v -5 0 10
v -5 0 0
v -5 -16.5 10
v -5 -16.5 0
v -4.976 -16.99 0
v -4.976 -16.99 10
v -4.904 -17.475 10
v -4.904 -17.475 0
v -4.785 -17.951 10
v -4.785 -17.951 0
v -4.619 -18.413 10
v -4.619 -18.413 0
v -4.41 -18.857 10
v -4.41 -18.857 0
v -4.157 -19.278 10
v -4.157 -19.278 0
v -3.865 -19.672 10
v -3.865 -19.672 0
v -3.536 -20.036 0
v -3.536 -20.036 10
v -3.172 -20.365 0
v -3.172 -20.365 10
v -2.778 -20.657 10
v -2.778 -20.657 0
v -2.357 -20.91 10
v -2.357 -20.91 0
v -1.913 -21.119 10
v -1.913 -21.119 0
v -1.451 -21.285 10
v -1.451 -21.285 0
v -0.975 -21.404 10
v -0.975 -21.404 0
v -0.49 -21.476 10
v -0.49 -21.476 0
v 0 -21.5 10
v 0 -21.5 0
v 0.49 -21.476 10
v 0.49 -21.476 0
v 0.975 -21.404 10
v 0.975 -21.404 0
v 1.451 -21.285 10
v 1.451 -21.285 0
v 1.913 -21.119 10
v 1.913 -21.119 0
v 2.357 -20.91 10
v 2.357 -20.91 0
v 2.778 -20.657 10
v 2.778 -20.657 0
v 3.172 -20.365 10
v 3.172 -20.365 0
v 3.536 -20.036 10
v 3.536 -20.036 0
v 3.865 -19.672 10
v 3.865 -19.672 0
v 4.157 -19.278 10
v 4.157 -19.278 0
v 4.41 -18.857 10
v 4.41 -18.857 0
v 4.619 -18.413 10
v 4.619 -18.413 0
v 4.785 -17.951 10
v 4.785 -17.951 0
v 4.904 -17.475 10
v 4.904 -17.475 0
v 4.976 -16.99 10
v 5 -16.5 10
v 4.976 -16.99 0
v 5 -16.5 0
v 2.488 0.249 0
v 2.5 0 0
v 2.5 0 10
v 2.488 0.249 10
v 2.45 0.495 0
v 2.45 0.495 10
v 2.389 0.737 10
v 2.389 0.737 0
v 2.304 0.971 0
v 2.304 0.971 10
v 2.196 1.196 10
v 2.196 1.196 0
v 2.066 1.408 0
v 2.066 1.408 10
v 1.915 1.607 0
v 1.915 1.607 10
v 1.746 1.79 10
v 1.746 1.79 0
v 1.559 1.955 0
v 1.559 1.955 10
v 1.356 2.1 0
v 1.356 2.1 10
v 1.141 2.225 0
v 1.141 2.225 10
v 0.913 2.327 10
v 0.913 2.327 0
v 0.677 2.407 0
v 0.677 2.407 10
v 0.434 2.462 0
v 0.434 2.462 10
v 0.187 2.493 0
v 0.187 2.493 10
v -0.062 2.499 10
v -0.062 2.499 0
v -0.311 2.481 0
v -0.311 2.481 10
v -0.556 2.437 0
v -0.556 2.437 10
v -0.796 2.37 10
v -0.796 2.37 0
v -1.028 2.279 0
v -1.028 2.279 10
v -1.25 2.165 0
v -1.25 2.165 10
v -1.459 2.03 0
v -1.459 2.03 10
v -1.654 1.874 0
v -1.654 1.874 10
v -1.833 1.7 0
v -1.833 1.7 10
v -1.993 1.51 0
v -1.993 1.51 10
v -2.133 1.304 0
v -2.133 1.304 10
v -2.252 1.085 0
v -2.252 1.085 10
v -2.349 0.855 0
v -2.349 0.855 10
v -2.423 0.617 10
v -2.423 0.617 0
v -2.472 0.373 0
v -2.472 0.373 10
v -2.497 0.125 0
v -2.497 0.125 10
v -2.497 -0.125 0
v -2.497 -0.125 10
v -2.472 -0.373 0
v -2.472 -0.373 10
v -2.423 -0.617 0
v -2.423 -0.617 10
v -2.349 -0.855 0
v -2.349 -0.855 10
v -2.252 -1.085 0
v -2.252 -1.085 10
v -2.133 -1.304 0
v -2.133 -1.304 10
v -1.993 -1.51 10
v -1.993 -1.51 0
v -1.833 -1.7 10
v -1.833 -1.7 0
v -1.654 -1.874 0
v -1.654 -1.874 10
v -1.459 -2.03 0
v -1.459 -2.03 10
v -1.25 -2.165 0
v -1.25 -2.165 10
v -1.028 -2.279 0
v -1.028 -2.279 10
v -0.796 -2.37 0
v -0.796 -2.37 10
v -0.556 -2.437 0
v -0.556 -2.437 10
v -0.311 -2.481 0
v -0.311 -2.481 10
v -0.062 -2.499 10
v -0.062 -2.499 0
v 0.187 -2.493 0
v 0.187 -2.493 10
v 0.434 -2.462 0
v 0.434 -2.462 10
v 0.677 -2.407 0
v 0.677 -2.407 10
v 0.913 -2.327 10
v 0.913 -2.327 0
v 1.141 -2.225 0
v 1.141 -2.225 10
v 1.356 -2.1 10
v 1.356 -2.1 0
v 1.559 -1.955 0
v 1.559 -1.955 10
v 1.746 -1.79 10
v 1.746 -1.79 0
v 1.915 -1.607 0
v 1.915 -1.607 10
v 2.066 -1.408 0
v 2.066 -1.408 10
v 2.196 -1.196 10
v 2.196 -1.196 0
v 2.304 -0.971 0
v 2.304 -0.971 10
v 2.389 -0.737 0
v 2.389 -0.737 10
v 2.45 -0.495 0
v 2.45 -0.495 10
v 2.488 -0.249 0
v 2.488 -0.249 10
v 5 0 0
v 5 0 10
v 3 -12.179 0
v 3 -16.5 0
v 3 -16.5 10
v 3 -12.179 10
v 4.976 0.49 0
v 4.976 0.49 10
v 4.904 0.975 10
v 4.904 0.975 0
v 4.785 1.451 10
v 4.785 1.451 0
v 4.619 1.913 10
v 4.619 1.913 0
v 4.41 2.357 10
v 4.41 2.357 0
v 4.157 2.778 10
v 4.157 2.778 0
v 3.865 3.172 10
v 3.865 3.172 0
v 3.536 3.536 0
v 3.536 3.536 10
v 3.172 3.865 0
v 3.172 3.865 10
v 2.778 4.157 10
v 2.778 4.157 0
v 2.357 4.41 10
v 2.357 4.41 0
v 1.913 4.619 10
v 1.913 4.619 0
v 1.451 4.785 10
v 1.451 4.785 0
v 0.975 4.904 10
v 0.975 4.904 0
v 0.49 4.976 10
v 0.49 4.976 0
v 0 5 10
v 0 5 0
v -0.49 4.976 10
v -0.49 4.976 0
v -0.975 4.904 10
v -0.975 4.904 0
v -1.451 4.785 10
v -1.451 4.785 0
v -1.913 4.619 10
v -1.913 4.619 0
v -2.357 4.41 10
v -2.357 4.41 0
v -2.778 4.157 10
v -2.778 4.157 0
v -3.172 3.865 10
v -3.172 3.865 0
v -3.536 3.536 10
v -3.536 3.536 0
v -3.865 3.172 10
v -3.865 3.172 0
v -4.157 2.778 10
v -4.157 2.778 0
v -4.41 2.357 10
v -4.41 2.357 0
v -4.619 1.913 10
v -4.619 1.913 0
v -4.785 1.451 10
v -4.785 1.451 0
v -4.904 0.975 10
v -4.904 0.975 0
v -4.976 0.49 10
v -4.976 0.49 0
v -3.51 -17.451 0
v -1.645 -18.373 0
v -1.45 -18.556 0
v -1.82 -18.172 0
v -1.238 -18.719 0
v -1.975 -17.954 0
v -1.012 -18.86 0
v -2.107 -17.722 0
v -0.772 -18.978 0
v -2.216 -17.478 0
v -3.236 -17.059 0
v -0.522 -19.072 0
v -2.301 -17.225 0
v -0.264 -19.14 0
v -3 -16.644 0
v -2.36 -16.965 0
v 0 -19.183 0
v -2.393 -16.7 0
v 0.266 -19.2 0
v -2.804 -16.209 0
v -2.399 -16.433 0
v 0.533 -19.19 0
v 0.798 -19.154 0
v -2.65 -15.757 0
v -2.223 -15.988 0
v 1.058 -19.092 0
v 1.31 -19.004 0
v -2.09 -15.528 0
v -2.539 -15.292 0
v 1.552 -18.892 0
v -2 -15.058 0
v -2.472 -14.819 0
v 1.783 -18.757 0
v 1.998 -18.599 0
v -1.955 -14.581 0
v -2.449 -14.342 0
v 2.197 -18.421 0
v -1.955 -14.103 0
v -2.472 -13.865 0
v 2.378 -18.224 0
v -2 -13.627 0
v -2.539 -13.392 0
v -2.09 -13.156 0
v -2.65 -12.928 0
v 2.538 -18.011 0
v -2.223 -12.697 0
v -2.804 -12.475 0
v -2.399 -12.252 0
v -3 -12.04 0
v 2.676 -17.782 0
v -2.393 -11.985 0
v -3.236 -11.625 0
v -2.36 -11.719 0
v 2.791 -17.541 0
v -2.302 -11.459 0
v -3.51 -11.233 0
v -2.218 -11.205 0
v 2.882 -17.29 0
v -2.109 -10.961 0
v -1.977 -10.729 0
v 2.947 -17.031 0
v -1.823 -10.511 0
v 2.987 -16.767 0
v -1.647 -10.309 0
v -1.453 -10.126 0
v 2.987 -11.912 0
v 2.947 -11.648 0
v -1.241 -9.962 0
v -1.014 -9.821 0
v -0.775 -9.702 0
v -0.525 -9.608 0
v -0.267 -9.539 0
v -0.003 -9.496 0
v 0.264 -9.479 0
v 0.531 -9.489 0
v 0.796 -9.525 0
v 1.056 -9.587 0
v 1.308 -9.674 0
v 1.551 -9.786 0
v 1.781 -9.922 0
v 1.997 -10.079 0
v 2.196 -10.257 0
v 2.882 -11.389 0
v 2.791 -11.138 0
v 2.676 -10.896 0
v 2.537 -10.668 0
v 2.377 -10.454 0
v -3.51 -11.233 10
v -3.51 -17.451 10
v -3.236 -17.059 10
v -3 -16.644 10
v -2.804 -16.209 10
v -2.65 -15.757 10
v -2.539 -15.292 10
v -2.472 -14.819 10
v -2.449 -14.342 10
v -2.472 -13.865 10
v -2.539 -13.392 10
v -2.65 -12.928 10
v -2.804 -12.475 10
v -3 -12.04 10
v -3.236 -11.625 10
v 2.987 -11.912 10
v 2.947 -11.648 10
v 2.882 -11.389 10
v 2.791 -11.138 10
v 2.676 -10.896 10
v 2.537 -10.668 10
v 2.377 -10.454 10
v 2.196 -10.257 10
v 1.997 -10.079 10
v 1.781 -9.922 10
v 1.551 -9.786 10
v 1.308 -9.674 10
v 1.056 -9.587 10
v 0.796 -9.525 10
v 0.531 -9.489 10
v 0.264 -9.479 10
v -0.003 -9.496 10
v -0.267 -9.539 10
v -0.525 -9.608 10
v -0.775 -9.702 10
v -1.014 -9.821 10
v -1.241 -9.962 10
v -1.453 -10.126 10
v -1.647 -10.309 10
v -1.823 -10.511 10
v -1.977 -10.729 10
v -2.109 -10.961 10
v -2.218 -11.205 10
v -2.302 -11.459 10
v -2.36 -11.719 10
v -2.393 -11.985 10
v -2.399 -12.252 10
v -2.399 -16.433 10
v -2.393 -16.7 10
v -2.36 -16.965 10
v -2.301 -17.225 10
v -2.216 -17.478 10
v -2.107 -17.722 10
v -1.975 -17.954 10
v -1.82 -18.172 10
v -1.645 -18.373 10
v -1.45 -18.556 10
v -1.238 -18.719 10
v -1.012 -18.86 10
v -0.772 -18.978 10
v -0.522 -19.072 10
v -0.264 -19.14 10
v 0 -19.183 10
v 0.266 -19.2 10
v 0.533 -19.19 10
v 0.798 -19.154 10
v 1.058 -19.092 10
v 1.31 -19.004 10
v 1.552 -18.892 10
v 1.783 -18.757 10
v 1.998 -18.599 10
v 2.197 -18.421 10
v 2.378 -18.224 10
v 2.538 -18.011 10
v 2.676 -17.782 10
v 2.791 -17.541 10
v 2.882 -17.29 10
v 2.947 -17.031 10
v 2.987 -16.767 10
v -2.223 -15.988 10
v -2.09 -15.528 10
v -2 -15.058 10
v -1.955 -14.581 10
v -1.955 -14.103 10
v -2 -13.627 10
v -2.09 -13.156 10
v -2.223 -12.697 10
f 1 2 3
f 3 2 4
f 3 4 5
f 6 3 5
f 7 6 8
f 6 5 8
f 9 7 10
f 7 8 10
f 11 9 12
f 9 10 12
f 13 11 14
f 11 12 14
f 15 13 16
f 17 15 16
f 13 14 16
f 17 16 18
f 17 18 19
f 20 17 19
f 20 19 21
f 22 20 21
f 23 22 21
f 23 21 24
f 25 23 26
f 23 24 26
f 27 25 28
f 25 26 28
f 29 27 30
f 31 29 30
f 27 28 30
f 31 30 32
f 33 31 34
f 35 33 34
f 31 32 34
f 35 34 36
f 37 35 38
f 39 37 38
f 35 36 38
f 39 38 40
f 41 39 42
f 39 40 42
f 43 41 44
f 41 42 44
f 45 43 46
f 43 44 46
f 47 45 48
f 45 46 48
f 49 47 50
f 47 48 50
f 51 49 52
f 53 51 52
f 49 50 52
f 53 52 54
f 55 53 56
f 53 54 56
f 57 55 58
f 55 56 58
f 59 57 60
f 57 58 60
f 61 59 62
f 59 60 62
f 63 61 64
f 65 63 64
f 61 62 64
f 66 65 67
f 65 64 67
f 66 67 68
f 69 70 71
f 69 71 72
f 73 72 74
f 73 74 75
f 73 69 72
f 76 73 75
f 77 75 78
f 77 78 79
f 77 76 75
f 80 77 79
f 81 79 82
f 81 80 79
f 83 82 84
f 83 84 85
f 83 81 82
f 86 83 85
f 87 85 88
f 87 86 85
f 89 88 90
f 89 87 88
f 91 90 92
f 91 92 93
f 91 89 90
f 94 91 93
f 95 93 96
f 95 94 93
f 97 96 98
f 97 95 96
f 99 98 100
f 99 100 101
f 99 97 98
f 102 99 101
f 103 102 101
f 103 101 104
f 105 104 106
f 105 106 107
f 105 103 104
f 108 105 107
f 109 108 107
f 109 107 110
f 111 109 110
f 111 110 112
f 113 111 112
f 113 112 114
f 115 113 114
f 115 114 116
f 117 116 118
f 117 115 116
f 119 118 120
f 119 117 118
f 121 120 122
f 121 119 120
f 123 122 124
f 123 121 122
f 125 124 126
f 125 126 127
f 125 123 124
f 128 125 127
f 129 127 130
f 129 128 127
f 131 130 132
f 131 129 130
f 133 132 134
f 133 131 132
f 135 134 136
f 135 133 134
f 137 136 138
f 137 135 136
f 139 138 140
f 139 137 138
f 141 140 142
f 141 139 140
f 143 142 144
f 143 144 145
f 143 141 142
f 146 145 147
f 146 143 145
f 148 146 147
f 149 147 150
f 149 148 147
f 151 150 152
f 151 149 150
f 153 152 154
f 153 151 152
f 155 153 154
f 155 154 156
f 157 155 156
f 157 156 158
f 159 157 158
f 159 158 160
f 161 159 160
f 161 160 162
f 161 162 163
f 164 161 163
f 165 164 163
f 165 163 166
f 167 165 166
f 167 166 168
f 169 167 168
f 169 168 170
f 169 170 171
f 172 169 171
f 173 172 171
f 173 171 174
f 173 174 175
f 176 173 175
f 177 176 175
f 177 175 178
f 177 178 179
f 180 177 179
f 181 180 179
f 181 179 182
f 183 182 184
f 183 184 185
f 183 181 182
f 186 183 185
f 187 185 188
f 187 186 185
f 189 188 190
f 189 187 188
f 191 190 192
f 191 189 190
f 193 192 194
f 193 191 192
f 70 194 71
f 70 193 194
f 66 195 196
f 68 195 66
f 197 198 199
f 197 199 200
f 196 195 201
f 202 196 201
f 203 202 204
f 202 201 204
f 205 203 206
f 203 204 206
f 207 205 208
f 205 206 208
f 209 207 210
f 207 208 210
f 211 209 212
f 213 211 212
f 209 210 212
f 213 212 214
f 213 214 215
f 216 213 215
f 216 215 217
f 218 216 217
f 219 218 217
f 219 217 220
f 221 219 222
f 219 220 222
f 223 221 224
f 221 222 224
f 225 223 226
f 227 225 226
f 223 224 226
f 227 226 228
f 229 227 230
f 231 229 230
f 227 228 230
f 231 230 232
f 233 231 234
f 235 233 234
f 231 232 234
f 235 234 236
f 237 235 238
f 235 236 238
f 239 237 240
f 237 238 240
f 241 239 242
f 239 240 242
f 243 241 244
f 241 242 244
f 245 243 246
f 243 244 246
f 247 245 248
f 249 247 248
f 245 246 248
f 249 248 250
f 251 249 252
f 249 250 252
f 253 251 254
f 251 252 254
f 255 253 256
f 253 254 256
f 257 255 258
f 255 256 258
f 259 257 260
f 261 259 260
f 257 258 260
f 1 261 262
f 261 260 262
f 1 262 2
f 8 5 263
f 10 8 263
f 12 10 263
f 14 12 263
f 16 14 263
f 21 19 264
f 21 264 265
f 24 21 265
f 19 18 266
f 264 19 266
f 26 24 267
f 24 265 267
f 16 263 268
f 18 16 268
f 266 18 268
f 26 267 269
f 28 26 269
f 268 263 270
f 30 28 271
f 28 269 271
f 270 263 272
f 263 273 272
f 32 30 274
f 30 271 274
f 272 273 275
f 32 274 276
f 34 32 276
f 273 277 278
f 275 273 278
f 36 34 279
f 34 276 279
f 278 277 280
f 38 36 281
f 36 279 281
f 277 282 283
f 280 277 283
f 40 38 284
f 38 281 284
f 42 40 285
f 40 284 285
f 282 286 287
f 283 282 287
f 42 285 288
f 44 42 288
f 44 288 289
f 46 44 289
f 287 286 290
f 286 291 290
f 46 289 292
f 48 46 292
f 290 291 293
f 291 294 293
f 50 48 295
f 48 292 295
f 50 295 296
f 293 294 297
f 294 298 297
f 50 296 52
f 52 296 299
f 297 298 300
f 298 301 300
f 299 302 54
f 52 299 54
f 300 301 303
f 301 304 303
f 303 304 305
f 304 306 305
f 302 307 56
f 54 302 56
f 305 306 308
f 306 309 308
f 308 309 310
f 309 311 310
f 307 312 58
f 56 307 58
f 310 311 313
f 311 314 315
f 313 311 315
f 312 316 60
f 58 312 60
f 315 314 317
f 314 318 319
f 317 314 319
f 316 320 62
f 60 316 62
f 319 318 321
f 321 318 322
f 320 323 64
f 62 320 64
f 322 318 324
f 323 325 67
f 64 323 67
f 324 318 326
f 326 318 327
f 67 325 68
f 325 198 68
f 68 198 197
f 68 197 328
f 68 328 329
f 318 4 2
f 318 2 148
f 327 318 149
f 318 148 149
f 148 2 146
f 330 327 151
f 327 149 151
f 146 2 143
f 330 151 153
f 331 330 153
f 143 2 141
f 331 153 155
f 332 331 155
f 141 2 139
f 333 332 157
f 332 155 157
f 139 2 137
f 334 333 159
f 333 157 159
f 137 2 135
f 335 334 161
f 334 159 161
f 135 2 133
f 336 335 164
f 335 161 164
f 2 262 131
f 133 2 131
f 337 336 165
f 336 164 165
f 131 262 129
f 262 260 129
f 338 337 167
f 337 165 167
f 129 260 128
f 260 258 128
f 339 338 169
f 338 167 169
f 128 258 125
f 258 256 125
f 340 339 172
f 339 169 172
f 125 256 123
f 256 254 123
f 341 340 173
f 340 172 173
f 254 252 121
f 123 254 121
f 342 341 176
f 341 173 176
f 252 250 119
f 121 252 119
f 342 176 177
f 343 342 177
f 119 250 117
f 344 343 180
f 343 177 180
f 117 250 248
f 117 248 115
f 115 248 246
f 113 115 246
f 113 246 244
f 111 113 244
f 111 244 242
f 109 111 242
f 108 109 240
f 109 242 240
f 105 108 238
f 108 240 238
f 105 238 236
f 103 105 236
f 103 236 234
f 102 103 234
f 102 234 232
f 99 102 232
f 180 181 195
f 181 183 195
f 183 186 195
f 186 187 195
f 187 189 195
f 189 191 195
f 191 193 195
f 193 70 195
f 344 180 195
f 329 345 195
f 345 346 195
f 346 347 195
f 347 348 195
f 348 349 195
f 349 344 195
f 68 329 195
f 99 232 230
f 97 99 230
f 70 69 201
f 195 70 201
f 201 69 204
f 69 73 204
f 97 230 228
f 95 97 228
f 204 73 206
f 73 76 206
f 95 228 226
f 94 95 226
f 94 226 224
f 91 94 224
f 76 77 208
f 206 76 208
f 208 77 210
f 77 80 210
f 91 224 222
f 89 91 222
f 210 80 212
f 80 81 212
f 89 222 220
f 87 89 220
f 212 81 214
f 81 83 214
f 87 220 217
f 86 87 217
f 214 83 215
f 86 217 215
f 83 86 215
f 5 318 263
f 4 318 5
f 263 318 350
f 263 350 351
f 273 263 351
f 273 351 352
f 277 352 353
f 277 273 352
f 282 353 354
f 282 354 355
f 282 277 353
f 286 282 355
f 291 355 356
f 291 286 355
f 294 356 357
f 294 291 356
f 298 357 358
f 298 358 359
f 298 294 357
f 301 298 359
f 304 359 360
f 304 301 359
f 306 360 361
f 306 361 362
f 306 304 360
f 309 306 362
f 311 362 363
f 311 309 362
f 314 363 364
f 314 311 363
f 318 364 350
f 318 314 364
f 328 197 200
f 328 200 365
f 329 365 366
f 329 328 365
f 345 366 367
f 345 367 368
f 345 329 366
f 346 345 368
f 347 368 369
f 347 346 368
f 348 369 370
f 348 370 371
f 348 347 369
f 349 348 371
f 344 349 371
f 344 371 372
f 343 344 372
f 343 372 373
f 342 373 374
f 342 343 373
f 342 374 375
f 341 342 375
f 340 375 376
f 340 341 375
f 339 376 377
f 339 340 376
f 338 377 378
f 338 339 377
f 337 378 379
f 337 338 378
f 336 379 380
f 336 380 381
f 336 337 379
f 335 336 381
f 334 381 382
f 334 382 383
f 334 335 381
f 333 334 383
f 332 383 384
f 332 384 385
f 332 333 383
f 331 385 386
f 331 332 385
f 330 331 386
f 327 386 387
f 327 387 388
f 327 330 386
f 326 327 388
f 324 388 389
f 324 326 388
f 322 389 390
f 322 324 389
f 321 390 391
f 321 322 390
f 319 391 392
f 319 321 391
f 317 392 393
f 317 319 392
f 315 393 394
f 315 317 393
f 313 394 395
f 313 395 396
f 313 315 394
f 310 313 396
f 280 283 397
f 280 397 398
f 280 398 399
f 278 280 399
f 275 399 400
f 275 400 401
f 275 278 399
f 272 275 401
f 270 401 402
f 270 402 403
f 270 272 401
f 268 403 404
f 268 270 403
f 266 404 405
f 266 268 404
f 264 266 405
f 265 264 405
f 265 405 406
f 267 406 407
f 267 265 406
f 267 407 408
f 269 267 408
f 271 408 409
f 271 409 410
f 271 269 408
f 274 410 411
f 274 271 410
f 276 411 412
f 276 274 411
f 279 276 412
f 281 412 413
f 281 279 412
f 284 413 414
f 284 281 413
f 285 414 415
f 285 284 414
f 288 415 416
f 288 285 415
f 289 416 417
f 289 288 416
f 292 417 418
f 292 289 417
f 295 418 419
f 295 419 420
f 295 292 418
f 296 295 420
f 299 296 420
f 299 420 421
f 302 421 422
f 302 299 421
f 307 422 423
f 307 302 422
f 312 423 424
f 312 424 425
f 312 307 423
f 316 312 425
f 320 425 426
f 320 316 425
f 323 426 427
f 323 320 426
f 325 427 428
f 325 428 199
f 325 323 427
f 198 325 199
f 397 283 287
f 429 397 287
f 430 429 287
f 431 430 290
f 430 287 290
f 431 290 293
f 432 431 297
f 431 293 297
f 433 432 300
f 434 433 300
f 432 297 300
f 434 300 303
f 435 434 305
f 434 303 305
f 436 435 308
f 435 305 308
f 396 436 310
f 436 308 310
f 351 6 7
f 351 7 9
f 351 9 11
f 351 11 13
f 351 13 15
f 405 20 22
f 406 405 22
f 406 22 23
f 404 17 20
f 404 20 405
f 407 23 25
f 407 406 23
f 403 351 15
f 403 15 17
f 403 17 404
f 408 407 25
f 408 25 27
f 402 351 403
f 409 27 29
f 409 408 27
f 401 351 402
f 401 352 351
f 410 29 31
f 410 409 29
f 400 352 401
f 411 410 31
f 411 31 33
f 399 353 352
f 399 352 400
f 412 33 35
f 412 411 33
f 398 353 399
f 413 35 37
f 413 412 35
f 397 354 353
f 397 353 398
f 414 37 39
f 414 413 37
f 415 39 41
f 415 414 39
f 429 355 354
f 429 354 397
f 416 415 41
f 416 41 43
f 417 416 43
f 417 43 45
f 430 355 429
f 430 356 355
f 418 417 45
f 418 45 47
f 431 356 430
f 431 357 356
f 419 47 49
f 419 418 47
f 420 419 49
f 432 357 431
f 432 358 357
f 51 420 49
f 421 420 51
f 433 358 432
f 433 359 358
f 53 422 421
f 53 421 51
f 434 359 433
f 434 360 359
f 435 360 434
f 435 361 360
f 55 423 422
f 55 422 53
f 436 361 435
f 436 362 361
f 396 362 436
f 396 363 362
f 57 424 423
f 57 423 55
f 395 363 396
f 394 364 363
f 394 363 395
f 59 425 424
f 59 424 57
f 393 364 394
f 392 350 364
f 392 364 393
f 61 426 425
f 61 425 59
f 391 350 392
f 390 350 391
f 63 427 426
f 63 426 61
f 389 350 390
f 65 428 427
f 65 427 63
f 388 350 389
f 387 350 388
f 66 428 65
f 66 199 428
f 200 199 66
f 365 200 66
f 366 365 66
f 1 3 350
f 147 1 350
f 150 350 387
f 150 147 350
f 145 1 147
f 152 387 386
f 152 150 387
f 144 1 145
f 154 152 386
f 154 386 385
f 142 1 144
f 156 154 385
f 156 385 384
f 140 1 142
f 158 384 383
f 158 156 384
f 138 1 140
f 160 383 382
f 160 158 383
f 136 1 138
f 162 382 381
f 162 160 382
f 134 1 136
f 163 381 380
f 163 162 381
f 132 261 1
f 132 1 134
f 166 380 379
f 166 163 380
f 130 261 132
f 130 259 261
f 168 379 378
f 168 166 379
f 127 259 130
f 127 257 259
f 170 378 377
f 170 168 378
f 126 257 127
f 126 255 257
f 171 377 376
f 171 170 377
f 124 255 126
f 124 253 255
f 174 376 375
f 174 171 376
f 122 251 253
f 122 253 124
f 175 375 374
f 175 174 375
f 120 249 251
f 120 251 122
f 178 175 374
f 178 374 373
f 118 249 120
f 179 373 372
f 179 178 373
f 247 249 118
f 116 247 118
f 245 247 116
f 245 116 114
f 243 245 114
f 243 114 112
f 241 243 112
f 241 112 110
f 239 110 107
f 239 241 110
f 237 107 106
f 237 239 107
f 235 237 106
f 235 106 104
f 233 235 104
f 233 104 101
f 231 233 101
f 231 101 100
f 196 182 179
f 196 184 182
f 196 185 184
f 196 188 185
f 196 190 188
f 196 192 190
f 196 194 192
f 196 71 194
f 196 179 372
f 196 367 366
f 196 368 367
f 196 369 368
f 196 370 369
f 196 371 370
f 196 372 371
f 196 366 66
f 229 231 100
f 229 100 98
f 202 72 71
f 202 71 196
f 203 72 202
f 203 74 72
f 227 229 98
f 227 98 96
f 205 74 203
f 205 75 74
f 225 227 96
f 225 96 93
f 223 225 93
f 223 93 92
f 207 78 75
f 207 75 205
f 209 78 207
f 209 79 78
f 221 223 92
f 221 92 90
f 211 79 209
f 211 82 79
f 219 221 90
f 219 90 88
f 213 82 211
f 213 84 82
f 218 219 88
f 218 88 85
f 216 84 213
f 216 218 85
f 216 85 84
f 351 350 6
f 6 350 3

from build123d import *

# Parameters (mm, degrees)
SKETCH_R      = 2.5
EXTRUDE_DEPTH = 10


with BuildPart() as part:
    # Sketch → Extrude (new body)
    with BuildSketch(Plane.XY):
        with BuildLine():
            ThreePointArc((5, 0), (0, 5), (-5, 0))
            Line((-5, 0), (-5, -16.5))
            ThreePointArc((-5, -16.5), (0, -21.5), (5, -16.5))
            Line((5, 0), (5, -16.5))
        make_face()
        Circle(SKETCH_R, mode=Mode.SUBTRACT)
        with BuildLine():
            ThreePointArc((-2.399039, -16.432516), (0.266373, -19.199789), (3.000118, -16.5))
            Line((3.000118, -16.5), (3.000118, -12.179214))
            ThreePointArc((3.000118, -12.179214), (0.263808, -9.479458), (-2.398906, -12.251828))
            ThreePointArc((-2.399039, -16.432516), (-1.949453, -14.342186), (-2.398906, -12.251828))
        make_face(mode=Mode.SUBTRACT)
        with BuildLine():
            ThreePointArc((-3.51031, -17.45064), (-2.449453, -14.342024), (-3.51031, -11.233408))
            Line((-3.51031, -11.233408), (-3.51031, -17.45064))
        make_face(mode=Mode.SUBTRACT)
    extrude(amount=EXTRUDE_DEPTH)


solid = part.part
